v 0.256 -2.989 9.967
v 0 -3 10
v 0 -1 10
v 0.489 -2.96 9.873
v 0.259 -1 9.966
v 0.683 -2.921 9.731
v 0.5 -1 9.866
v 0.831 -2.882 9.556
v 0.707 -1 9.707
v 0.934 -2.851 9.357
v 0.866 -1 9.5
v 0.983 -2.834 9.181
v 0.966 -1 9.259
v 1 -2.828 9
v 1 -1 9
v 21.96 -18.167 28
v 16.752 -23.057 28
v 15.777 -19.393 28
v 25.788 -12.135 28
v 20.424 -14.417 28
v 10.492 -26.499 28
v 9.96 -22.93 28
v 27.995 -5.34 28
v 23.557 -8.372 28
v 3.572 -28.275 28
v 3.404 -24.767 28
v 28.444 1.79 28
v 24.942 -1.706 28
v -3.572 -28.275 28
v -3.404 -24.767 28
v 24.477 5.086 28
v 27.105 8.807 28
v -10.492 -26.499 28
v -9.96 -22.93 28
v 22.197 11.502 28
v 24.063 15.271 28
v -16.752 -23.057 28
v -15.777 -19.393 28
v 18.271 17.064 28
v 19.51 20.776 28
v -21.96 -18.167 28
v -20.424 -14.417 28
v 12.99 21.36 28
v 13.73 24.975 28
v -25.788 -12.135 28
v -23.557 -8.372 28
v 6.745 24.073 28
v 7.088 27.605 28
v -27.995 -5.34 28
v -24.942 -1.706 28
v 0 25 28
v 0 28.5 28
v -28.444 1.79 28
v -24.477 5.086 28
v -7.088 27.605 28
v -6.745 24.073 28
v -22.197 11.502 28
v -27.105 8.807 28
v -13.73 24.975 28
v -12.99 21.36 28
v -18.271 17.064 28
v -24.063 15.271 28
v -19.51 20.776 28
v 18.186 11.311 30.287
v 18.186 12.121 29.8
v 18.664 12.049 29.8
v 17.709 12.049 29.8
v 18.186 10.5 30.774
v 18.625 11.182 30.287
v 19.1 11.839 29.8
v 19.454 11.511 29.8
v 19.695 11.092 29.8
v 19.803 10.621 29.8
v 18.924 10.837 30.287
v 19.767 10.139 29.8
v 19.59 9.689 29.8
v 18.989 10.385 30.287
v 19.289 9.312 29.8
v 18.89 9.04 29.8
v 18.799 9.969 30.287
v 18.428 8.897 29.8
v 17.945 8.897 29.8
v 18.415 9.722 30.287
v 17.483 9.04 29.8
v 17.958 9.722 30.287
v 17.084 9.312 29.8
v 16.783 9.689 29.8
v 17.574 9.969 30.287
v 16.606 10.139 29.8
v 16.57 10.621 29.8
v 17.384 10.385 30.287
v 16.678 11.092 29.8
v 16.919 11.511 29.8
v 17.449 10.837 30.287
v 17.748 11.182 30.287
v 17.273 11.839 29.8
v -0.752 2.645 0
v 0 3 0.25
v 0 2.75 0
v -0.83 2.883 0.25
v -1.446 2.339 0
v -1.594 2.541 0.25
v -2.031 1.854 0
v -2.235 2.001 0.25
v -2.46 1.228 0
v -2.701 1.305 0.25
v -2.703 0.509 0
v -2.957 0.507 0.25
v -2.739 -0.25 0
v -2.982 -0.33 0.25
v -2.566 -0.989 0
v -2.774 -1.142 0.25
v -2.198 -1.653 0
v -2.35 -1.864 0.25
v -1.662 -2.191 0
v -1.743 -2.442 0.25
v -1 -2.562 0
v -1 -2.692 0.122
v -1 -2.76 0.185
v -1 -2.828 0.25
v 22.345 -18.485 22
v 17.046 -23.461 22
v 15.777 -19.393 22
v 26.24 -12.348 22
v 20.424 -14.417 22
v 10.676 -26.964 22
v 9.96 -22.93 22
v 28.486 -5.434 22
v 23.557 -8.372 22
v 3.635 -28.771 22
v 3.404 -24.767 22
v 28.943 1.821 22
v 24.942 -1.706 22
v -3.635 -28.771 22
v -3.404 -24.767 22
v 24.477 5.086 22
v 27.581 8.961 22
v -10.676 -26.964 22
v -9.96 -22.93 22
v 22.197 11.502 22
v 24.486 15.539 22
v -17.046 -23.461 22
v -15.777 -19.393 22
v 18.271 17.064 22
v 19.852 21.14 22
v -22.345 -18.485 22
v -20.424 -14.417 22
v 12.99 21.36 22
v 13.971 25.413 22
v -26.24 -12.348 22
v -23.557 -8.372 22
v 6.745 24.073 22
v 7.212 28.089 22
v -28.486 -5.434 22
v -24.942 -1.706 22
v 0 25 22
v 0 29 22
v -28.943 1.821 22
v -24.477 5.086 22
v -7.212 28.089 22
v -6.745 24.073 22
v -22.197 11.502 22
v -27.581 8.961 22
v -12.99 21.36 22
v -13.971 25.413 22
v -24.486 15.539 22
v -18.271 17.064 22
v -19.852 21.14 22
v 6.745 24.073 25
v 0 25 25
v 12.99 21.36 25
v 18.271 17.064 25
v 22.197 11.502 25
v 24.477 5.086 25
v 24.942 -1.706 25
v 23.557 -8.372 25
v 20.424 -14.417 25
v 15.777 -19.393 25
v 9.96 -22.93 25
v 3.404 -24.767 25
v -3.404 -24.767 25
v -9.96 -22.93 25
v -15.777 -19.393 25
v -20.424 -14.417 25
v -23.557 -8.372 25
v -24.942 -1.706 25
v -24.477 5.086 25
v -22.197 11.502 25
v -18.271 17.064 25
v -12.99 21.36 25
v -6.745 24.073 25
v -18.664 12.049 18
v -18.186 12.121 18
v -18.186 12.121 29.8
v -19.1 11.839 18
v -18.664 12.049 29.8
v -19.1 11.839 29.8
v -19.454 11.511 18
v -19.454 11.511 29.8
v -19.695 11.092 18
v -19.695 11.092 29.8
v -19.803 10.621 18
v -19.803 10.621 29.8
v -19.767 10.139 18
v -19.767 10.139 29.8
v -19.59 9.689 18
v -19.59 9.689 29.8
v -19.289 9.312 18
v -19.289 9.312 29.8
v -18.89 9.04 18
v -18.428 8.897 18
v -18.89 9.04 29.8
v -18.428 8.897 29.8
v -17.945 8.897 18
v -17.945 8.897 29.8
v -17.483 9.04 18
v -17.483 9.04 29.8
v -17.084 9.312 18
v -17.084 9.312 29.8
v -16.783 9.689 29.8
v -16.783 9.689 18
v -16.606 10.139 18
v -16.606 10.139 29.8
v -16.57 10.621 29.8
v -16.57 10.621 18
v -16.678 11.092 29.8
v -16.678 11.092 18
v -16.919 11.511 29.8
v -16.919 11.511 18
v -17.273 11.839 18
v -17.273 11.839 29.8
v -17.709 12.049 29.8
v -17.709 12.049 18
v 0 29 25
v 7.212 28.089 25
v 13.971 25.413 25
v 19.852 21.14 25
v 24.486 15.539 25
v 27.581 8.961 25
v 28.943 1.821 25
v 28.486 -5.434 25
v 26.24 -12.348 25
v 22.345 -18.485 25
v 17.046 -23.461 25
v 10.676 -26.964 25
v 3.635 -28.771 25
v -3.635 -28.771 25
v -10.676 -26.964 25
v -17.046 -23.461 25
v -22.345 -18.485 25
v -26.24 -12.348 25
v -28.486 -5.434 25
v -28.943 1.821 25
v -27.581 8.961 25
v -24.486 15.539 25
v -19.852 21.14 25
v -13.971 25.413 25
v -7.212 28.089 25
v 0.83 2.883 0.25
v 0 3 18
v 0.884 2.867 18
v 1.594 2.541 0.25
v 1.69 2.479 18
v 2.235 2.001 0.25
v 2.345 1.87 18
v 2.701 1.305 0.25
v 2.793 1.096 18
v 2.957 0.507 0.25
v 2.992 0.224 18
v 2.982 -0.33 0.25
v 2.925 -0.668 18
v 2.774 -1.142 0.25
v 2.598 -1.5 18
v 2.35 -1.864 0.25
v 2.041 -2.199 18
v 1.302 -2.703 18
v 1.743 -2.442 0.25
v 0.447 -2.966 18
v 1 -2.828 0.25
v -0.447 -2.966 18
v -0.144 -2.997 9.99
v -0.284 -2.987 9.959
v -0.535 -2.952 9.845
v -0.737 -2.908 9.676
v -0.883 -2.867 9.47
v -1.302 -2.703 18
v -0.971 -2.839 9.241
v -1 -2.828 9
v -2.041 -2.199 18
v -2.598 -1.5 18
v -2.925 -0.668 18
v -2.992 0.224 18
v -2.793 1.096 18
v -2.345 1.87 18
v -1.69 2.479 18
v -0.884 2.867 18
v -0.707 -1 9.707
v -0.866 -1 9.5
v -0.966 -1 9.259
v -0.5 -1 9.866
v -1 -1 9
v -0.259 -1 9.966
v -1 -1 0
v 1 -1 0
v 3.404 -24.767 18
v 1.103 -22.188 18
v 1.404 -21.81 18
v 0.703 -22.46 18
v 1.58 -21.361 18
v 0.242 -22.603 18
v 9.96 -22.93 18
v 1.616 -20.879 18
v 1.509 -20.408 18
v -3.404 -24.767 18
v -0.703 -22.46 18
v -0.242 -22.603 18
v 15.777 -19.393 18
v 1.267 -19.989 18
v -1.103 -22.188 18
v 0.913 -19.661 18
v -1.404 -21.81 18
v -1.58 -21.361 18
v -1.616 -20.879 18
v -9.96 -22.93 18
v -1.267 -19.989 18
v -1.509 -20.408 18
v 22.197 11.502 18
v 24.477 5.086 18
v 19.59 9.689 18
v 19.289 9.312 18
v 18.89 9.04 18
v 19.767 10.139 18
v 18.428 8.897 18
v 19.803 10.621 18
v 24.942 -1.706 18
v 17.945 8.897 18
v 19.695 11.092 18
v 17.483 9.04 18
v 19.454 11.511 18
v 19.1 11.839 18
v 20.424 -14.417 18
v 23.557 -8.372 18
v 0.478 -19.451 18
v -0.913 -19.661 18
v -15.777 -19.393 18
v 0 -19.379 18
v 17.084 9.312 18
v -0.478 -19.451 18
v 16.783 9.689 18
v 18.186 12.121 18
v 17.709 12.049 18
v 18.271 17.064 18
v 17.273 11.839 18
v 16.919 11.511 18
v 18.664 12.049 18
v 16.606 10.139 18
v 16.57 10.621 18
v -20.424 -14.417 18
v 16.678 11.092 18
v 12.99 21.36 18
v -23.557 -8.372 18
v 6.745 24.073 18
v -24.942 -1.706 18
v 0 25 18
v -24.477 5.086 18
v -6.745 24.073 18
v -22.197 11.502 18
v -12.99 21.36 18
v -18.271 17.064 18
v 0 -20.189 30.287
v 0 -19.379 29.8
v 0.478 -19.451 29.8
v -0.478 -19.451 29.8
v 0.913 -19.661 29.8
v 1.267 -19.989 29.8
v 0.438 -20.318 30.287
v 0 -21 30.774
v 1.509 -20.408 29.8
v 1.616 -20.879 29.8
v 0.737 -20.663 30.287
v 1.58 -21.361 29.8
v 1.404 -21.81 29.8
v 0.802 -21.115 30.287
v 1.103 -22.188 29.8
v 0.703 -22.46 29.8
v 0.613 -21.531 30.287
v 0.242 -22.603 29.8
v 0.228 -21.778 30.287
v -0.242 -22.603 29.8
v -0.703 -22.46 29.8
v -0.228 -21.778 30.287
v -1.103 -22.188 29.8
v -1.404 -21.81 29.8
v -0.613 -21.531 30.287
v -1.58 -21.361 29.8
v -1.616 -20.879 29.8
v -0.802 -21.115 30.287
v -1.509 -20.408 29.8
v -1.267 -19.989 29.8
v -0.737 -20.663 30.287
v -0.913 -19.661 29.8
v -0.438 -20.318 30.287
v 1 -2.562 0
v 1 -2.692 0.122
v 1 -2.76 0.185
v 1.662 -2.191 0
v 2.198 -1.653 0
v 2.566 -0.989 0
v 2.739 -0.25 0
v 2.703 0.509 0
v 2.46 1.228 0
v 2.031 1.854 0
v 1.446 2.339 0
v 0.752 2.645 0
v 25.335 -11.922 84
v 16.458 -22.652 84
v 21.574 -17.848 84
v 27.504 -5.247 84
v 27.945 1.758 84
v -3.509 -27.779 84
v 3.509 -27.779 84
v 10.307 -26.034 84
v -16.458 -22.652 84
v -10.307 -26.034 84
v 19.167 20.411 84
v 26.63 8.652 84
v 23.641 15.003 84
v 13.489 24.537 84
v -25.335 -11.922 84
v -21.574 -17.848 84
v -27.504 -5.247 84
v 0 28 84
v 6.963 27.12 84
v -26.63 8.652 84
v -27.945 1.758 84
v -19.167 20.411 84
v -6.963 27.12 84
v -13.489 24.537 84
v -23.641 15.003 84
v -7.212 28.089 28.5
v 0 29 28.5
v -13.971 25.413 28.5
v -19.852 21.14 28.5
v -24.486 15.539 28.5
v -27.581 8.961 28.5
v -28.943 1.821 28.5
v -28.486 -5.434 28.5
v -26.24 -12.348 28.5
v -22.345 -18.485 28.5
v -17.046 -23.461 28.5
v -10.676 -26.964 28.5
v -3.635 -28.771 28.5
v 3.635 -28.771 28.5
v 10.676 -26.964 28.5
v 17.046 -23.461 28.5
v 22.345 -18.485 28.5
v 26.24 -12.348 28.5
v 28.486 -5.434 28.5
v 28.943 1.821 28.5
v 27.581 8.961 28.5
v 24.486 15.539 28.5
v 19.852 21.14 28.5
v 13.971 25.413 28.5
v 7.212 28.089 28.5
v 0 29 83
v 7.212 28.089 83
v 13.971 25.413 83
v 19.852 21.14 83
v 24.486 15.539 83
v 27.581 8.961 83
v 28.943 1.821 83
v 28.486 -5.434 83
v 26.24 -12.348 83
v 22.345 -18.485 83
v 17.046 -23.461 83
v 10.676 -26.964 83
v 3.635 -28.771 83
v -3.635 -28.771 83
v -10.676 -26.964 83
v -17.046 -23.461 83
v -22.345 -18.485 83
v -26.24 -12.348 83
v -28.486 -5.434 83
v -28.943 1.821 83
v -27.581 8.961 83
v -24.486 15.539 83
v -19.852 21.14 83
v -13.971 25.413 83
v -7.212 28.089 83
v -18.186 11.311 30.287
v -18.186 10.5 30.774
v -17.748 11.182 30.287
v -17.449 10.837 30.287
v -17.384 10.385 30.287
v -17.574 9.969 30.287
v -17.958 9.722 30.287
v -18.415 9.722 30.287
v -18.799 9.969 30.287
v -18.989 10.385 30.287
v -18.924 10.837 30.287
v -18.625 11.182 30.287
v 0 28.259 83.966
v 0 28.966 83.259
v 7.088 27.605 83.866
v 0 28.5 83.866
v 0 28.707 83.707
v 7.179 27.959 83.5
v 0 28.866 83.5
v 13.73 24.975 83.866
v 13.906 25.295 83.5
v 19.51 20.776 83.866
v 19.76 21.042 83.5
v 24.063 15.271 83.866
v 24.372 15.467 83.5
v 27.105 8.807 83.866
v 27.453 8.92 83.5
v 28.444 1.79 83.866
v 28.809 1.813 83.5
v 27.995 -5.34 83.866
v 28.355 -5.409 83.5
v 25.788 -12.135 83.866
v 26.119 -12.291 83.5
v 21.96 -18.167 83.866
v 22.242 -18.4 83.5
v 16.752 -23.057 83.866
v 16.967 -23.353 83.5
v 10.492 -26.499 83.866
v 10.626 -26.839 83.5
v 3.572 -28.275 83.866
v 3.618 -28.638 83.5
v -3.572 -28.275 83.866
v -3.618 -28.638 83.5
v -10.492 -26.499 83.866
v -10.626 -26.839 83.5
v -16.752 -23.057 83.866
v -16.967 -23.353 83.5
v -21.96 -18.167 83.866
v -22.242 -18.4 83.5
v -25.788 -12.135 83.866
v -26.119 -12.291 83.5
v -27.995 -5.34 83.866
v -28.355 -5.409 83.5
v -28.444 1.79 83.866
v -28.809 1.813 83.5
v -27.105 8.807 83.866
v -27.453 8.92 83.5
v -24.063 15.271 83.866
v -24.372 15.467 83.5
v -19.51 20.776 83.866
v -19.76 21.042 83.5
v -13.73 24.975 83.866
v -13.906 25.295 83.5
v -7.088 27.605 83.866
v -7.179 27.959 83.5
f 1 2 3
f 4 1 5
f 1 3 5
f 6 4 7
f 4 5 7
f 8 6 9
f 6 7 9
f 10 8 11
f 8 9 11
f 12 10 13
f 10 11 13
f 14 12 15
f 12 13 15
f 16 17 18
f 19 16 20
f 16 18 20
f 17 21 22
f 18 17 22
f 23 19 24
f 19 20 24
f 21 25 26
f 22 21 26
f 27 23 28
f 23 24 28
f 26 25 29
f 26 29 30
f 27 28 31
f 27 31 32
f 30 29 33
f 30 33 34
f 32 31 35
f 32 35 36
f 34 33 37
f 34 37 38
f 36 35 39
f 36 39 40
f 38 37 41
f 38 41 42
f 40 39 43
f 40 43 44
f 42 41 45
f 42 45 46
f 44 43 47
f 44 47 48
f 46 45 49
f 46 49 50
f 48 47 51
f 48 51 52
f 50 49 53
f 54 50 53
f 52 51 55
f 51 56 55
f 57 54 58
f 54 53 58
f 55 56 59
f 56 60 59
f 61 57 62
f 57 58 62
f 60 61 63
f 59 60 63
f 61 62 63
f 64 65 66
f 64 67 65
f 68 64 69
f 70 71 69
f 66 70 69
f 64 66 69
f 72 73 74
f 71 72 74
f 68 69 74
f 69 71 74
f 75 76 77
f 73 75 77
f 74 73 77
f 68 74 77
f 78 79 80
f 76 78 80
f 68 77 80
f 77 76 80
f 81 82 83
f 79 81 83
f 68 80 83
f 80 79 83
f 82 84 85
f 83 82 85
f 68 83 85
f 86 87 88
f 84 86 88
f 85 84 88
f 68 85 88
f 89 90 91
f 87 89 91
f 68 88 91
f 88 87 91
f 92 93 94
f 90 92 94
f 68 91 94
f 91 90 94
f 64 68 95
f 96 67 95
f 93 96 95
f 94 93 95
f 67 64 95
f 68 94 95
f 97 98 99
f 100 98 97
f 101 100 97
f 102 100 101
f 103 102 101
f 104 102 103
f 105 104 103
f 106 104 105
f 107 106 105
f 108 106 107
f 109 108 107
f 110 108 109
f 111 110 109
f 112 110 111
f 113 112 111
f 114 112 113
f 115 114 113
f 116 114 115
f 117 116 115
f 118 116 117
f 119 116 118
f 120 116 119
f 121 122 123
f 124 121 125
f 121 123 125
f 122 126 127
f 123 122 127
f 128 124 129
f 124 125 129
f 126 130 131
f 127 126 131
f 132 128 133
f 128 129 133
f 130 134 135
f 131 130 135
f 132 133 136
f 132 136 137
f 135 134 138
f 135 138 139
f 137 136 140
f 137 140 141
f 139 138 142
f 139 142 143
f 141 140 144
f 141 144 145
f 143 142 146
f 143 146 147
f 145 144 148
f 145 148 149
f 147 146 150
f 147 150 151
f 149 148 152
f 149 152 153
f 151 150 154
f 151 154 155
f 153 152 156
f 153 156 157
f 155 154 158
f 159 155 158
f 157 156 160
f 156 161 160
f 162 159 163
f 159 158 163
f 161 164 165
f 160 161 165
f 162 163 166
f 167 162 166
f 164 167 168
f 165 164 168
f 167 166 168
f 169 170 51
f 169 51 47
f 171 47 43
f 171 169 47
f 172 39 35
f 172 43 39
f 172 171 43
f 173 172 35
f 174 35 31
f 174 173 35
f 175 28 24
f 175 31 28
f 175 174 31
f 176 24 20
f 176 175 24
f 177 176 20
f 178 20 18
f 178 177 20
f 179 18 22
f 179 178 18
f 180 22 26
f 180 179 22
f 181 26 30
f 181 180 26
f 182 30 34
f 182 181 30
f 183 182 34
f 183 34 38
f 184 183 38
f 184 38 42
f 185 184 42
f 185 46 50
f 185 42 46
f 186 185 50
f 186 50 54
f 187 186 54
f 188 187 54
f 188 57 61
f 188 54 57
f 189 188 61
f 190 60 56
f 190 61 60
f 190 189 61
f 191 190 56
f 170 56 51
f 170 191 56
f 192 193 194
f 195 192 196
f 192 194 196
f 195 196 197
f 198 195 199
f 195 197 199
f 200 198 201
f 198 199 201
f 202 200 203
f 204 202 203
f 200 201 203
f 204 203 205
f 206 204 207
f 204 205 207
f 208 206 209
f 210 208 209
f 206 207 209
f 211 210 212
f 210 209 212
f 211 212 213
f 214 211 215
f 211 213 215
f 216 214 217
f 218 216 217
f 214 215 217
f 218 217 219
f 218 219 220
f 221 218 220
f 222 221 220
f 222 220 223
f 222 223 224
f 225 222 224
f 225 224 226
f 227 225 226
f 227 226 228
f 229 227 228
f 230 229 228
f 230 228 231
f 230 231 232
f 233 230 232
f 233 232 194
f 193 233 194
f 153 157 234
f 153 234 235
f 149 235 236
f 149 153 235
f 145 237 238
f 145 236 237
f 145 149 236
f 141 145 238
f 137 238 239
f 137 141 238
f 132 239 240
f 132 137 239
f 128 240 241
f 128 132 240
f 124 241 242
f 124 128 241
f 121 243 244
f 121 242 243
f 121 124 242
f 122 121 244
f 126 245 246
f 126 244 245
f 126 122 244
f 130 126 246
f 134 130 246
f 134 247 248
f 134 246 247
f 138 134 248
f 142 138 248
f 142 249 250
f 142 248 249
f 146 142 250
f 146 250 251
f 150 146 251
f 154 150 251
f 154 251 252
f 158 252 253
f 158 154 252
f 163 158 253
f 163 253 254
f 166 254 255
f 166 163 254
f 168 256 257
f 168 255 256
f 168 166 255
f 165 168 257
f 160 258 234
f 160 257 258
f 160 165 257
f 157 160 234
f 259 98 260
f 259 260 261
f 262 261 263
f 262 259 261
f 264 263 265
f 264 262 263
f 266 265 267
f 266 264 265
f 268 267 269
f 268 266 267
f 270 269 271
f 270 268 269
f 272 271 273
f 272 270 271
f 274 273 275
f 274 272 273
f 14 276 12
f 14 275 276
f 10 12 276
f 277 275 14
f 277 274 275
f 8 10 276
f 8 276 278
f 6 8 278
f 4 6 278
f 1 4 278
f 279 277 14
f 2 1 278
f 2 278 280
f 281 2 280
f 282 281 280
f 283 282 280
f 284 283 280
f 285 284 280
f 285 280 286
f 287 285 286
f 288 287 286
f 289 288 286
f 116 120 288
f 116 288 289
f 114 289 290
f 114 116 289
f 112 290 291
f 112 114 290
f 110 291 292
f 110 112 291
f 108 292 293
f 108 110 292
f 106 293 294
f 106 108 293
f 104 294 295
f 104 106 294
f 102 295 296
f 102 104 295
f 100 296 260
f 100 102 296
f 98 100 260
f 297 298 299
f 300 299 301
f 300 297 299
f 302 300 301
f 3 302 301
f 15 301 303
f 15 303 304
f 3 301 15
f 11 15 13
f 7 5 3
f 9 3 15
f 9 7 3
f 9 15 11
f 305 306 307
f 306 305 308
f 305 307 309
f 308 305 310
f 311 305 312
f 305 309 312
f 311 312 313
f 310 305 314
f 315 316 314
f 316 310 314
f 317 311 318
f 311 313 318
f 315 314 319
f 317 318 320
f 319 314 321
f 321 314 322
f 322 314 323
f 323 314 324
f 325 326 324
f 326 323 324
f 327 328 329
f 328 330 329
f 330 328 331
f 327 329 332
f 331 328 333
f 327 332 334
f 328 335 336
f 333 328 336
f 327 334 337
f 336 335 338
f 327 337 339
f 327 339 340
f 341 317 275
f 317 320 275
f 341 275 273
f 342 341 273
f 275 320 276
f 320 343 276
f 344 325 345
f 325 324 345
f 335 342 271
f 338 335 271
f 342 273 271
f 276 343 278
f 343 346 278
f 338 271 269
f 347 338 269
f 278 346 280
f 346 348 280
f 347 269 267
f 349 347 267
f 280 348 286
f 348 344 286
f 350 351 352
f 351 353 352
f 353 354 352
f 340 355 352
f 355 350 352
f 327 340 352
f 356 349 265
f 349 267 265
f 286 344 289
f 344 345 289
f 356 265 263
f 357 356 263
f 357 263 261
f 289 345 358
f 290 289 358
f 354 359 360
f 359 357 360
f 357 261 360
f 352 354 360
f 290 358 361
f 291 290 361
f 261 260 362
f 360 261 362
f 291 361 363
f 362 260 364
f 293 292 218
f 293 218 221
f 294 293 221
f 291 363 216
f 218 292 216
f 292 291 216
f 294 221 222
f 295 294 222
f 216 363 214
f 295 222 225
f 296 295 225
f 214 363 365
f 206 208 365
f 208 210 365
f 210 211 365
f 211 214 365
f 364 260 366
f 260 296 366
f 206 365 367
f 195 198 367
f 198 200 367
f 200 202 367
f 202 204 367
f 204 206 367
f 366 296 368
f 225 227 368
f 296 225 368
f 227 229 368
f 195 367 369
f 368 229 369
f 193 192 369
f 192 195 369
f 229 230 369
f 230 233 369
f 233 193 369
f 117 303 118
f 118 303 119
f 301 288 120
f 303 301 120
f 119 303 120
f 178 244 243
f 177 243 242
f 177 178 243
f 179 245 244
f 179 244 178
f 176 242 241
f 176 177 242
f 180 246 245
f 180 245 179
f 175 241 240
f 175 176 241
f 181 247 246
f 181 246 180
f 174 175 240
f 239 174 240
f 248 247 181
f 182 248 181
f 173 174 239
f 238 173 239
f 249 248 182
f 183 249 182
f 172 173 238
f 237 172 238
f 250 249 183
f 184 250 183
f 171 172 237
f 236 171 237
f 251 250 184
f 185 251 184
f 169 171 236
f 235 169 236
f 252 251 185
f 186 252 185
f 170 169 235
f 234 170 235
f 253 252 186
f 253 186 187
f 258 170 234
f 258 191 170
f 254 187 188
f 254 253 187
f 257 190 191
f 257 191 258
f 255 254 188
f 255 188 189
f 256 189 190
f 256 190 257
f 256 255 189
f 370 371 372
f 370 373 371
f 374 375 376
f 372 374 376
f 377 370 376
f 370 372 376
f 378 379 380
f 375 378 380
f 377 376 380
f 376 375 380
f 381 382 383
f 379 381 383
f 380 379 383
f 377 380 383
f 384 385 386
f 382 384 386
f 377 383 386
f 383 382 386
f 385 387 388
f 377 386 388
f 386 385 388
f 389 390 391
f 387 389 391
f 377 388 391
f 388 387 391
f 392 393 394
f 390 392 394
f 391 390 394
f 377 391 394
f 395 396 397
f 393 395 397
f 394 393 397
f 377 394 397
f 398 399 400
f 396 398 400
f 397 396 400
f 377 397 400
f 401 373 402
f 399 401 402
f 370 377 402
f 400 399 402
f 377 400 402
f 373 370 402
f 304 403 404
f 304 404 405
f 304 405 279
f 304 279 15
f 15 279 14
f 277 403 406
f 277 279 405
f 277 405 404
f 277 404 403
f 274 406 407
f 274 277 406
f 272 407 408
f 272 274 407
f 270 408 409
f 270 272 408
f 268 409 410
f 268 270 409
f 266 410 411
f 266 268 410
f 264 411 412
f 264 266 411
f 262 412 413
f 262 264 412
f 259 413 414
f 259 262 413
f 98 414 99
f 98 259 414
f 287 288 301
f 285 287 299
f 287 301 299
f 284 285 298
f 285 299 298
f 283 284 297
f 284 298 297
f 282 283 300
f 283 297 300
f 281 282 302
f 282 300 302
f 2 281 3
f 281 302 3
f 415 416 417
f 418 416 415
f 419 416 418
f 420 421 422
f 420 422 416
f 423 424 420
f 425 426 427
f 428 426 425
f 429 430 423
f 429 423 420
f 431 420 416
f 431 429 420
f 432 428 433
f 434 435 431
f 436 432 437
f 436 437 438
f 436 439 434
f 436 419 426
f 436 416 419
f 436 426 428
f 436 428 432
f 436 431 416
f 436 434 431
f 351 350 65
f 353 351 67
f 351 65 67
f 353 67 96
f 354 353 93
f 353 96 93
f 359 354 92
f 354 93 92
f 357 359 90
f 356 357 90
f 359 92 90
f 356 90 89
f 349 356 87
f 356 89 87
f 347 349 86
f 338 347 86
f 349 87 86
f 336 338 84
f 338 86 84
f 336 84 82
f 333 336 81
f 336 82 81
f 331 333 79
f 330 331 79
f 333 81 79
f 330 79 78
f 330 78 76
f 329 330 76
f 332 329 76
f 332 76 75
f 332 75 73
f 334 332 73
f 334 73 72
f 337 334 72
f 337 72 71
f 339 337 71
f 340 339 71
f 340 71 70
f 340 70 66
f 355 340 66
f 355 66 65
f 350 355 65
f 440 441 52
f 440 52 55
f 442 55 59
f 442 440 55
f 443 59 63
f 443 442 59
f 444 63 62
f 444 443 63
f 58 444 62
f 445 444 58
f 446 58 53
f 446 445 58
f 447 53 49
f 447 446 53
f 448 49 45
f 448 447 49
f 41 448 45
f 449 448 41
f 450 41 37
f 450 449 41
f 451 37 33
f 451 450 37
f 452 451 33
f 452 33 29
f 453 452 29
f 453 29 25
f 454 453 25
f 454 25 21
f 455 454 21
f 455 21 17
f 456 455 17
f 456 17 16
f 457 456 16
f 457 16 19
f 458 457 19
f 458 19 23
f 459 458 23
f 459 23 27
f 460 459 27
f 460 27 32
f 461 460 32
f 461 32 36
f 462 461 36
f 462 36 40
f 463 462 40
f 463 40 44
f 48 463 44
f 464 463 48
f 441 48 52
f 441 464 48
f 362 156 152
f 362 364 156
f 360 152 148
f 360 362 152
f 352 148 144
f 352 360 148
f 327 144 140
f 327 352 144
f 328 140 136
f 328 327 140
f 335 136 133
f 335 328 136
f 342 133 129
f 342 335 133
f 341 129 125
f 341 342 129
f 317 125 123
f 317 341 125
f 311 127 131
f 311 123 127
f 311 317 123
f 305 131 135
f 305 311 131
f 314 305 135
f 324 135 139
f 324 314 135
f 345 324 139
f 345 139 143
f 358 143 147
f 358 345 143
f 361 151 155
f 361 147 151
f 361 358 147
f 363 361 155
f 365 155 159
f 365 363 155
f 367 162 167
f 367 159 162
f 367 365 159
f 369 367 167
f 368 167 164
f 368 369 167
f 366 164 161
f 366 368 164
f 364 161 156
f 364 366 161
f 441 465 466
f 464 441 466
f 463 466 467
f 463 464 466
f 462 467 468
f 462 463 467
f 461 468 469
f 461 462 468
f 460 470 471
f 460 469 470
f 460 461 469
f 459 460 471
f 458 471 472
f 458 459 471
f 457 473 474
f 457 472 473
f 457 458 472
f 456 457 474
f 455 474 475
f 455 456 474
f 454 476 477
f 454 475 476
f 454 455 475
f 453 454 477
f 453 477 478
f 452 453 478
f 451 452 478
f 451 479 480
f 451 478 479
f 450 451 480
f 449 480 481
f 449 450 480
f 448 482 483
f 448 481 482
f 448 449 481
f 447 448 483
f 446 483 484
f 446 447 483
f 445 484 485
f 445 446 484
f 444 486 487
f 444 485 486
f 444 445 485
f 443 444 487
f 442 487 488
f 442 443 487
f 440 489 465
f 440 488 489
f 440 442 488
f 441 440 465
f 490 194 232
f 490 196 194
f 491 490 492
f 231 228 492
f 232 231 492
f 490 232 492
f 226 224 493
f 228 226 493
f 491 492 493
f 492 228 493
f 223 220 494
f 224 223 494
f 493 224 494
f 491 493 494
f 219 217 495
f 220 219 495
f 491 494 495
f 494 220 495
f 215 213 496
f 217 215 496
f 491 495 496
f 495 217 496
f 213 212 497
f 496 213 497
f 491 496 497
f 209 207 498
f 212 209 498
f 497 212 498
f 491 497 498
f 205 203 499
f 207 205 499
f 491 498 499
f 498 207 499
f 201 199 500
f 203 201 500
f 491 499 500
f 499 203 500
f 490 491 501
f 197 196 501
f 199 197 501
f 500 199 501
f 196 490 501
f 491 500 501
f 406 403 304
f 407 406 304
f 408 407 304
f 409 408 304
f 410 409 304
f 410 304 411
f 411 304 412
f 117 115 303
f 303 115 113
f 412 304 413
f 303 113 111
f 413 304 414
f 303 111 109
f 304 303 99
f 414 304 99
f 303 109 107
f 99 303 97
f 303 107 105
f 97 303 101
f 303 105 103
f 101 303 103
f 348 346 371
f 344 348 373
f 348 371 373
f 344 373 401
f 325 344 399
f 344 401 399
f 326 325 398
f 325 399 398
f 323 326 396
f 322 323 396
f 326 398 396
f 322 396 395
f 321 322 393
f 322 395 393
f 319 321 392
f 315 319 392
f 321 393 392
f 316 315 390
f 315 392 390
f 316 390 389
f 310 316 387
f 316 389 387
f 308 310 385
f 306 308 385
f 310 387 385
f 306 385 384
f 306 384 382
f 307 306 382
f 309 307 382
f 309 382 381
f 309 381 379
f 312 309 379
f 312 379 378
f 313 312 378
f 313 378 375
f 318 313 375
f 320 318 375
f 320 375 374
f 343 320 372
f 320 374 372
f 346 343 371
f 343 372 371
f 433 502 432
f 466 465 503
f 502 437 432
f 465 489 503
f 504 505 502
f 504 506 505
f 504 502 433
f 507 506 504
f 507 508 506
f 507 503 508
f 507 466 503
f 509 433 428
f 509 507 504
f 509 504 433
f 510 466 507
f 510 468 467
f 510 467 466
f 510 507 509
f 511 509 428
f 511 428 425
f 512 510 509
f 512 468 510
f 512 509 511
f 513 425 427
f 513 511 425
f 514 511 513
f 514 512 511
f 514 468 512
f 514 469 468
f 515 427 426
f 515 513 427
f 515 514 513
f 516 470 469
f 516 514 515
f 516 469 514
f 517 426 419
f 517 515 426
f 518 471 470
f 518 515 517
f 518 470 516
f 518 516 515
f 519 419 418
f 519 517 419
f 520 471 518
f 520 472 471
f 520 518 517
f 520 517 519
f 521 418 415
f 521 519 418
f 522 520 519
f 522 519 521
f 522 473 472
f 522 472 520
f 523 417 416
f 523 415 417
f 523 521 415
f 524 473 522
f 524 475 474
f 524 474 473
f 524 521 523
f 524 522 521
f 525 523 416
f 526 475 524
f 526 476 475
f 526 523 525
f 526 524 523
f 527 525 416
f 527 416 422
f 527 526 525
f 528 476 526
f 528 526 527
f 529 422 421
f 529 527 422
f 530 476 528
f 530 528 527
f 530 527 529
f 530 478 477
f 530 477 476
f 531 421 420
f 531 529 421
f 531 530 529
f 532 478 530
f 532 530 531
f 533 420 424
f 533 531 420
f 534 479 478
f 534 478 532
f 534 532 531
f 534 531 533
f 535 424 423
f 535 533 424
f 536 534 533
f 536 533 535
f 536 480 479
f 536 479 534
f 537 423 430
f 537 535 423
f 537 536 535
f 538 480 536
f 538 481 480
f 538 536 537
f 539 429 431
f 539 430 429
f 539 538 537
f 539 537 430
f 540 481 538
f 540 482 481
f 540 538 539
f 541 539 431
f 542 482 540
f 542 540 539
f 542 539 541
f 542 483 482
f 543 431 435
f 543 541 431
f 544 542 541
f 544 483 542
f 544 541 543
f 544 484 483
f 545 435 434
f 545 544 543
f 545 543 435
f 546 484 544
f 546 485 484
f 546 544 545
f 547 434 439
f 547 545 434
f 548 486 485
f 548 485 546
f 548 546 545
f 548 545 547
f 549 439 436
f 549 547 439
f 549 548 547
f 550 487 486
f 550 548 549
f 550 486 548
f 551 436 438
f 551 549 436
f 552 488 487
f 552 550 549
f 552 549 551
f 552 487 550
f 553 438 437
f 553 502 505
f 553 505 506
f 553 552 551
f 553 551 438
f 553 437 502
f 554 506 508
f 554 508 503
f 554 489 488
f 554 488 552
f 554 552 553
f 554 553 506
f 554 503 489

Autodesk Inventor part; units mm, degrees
ref_plane "YZ Plane" through (0, 0, 0) normal (1, 0, 0) x (0, 1, 0)
ref_plane "XZ Plane" through (0, 0, 0) normal (0, 1, 0) x (-1, 0, 0)
sketch "Sketch1" plane through (0, 0, 0) normal (1, 0, 0) x (0, 1, 0)
  line L0 (0, 0) -> (0, 84)
  line L1 (0, 84) -> (29, 84)
  line L2 (29, 84) -> (29, 28)
  line L3 (29, 28) -> (25, 28)
  line L4 (25, 28) -> (25, 25)
  line L5 (25, 25) -> (29, 25)
  line L6 (29, 25) -> (29, 22)
  line L7 (29, 22) -> (25, 22)
  line L8 (25, 22) -> (25, 18)
  line L9 (25, 18) -> (3, 18)
  line L10 (3, 18) -> (3, 0)
  line L11 (3, 0) -> (0, 0)
  dimension "d0" = 84
  dimension "d1" = 29
  dimension "d2" = 56
  dimension "d5" = 4
  dimension "d6" = 3
  dimension "d7" = 4
  dimension "d8" = 3
  dimension "d9" = 4
  dimension "d10" = 4
  dimension "d11" = 22
revolve "Revolution1" add sketch "Sketch1" angle 360 about axis through (0, 0, 0) along (0, 0, 1)
fillet "Fillet1" radius 1 1 edges at (0, -29, 84)
chamfer "Chamfer1" distance 0.5 angle 45 1 edges at (0, -29, 28)
sketch "Sketch2" plane through (0, 0, 18) normal (0, 0, -1) x (-1, 0, 0)
  line L0 (0, 0) -> (0, -21)
  circle A0 centre (0, -21) radius 1
  circle A1 centre (18.1865, 10.5) radius 1
  circle A2 centre (-18.1865, 10.5) radius 1
  dimension "d17" = 21
  dimension "d18" = 2
  dimension "d21" = 360
extrude "Extrusion1" cut sketch "Sketch2" against normal blind 8
hole "Hole1" at (0, -21, 18) direction (0, 0, 1) diameter 3.242 depth 11.8 tip angle 118 thread size "M4x0.7" class "6H" standard "ISO Metric profile"
hole "Hole2" at (18.1865, 10.5, 18) direction (0, 0, 1) diameter 3.242 depth 11.8 tip angle 118 thread size "M4x0.7" class "6H" standard "ISO Metric profile"
hole "Hole3" at (-18.1865, 10.5, 18) direction (0, 0, 1) diameter 3.242 depth 11.8 tip angle 118 thread size "M4x0.7" class "6H" standard "ISO Metric profile"
sketch "Sketch5" plane through (0, 0, 0) normal (0, 0, -1) x (-1, 0, 0)
  point P0 (0, 0)
sketch "Sketch6" plane through (0, 0, 0) normal (0, 0, -1) x (-1, 0, 0)
  line L0 (0, 0) -> (0, -3)
  dimension "d62" = 3
ref_plane "Work Plane2" through (0, -3, 0) normal (0, -1, 0) x (1, 0, 0)
sketch "Sketch7" plane through (0, -3, 0) normal (0, -1, 0) x (1, 0, 0)
  line L0 (-3, 18) -> (-3, 0) projected
  line L1 (3, 18) -> (3, 0) projected
  line L2 (-3, 0) -> (3, 0) projected
  line L3 (-25, 18) -> (25, 18) projected
  line L4 (-1, 0) -> (1, 0)
  line L5 (1, 0) -> (1, 10)
  line L6 (1, 10) -> (-1, 10)
  line L7 (-1, 10) -> (-1, 0)
  point P0 (0, 0)
  dimension "d63" = 10
  dimension "d64" = 2
  dimension "d66" = 2
extrude "Extrusion3" cut sketch "Sketch7" against normal blind 2 contours L7 L6 L5 L2
chamfer "Chamfer3" distance 0.25 angle 45 2 edges at (2.9568, 0.5073, 0) (-2.9568, 0.5073, 0)
fillet "Fillet2" radius 1 2 edges at (-1, -1.9142, 10) (1, -1.9142, 10)
properties part number "Tachometer"
